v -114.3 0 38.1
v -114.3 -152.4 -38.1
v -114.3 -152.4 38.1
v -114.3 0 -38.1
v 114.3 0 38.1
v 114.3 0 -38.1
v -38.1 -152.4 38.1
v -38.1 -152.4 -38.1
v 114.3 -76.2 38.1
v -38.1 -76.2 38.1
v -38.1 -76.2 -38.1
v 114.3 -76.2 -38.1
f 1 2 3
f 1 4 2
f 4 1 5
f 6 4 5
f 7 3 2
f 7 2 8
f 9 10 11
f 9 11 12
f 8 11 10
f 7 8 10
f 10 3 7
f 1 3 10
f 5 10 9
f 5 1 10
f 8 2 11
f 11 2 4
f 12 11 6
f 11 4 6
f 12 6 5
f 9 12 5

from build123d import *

# Parameters (mm, degrees)
F1_W     = 228.6
F1_H     = 76.2
F2_DEPTH = 76.2
F3_W     = 76.2
F3_H     = 76.2
F4_DEPTH = 76.2


# Not quite as in the source:
# - a variable given as a bare number and used for a length is read in inches; the dataset says mm whatever the document's units were


with BuildPart() as f2:
    # F1 (on Front) → F2 (new body)
    with BuildSketch(Plane.XZ):
        Rectangle(F1_W, F1_H)
    extrude(amount=F2_DEPTH)

    # F3 (on face) → F4 (join)
    with BuildSketch(Plane.XZ.offset(76.2)):
        with Locations((-76.2, 0)):
            Rectangle(F3_W, F3_H)
    extrude(amount=F4_DEPTH)


solid = f2.part
